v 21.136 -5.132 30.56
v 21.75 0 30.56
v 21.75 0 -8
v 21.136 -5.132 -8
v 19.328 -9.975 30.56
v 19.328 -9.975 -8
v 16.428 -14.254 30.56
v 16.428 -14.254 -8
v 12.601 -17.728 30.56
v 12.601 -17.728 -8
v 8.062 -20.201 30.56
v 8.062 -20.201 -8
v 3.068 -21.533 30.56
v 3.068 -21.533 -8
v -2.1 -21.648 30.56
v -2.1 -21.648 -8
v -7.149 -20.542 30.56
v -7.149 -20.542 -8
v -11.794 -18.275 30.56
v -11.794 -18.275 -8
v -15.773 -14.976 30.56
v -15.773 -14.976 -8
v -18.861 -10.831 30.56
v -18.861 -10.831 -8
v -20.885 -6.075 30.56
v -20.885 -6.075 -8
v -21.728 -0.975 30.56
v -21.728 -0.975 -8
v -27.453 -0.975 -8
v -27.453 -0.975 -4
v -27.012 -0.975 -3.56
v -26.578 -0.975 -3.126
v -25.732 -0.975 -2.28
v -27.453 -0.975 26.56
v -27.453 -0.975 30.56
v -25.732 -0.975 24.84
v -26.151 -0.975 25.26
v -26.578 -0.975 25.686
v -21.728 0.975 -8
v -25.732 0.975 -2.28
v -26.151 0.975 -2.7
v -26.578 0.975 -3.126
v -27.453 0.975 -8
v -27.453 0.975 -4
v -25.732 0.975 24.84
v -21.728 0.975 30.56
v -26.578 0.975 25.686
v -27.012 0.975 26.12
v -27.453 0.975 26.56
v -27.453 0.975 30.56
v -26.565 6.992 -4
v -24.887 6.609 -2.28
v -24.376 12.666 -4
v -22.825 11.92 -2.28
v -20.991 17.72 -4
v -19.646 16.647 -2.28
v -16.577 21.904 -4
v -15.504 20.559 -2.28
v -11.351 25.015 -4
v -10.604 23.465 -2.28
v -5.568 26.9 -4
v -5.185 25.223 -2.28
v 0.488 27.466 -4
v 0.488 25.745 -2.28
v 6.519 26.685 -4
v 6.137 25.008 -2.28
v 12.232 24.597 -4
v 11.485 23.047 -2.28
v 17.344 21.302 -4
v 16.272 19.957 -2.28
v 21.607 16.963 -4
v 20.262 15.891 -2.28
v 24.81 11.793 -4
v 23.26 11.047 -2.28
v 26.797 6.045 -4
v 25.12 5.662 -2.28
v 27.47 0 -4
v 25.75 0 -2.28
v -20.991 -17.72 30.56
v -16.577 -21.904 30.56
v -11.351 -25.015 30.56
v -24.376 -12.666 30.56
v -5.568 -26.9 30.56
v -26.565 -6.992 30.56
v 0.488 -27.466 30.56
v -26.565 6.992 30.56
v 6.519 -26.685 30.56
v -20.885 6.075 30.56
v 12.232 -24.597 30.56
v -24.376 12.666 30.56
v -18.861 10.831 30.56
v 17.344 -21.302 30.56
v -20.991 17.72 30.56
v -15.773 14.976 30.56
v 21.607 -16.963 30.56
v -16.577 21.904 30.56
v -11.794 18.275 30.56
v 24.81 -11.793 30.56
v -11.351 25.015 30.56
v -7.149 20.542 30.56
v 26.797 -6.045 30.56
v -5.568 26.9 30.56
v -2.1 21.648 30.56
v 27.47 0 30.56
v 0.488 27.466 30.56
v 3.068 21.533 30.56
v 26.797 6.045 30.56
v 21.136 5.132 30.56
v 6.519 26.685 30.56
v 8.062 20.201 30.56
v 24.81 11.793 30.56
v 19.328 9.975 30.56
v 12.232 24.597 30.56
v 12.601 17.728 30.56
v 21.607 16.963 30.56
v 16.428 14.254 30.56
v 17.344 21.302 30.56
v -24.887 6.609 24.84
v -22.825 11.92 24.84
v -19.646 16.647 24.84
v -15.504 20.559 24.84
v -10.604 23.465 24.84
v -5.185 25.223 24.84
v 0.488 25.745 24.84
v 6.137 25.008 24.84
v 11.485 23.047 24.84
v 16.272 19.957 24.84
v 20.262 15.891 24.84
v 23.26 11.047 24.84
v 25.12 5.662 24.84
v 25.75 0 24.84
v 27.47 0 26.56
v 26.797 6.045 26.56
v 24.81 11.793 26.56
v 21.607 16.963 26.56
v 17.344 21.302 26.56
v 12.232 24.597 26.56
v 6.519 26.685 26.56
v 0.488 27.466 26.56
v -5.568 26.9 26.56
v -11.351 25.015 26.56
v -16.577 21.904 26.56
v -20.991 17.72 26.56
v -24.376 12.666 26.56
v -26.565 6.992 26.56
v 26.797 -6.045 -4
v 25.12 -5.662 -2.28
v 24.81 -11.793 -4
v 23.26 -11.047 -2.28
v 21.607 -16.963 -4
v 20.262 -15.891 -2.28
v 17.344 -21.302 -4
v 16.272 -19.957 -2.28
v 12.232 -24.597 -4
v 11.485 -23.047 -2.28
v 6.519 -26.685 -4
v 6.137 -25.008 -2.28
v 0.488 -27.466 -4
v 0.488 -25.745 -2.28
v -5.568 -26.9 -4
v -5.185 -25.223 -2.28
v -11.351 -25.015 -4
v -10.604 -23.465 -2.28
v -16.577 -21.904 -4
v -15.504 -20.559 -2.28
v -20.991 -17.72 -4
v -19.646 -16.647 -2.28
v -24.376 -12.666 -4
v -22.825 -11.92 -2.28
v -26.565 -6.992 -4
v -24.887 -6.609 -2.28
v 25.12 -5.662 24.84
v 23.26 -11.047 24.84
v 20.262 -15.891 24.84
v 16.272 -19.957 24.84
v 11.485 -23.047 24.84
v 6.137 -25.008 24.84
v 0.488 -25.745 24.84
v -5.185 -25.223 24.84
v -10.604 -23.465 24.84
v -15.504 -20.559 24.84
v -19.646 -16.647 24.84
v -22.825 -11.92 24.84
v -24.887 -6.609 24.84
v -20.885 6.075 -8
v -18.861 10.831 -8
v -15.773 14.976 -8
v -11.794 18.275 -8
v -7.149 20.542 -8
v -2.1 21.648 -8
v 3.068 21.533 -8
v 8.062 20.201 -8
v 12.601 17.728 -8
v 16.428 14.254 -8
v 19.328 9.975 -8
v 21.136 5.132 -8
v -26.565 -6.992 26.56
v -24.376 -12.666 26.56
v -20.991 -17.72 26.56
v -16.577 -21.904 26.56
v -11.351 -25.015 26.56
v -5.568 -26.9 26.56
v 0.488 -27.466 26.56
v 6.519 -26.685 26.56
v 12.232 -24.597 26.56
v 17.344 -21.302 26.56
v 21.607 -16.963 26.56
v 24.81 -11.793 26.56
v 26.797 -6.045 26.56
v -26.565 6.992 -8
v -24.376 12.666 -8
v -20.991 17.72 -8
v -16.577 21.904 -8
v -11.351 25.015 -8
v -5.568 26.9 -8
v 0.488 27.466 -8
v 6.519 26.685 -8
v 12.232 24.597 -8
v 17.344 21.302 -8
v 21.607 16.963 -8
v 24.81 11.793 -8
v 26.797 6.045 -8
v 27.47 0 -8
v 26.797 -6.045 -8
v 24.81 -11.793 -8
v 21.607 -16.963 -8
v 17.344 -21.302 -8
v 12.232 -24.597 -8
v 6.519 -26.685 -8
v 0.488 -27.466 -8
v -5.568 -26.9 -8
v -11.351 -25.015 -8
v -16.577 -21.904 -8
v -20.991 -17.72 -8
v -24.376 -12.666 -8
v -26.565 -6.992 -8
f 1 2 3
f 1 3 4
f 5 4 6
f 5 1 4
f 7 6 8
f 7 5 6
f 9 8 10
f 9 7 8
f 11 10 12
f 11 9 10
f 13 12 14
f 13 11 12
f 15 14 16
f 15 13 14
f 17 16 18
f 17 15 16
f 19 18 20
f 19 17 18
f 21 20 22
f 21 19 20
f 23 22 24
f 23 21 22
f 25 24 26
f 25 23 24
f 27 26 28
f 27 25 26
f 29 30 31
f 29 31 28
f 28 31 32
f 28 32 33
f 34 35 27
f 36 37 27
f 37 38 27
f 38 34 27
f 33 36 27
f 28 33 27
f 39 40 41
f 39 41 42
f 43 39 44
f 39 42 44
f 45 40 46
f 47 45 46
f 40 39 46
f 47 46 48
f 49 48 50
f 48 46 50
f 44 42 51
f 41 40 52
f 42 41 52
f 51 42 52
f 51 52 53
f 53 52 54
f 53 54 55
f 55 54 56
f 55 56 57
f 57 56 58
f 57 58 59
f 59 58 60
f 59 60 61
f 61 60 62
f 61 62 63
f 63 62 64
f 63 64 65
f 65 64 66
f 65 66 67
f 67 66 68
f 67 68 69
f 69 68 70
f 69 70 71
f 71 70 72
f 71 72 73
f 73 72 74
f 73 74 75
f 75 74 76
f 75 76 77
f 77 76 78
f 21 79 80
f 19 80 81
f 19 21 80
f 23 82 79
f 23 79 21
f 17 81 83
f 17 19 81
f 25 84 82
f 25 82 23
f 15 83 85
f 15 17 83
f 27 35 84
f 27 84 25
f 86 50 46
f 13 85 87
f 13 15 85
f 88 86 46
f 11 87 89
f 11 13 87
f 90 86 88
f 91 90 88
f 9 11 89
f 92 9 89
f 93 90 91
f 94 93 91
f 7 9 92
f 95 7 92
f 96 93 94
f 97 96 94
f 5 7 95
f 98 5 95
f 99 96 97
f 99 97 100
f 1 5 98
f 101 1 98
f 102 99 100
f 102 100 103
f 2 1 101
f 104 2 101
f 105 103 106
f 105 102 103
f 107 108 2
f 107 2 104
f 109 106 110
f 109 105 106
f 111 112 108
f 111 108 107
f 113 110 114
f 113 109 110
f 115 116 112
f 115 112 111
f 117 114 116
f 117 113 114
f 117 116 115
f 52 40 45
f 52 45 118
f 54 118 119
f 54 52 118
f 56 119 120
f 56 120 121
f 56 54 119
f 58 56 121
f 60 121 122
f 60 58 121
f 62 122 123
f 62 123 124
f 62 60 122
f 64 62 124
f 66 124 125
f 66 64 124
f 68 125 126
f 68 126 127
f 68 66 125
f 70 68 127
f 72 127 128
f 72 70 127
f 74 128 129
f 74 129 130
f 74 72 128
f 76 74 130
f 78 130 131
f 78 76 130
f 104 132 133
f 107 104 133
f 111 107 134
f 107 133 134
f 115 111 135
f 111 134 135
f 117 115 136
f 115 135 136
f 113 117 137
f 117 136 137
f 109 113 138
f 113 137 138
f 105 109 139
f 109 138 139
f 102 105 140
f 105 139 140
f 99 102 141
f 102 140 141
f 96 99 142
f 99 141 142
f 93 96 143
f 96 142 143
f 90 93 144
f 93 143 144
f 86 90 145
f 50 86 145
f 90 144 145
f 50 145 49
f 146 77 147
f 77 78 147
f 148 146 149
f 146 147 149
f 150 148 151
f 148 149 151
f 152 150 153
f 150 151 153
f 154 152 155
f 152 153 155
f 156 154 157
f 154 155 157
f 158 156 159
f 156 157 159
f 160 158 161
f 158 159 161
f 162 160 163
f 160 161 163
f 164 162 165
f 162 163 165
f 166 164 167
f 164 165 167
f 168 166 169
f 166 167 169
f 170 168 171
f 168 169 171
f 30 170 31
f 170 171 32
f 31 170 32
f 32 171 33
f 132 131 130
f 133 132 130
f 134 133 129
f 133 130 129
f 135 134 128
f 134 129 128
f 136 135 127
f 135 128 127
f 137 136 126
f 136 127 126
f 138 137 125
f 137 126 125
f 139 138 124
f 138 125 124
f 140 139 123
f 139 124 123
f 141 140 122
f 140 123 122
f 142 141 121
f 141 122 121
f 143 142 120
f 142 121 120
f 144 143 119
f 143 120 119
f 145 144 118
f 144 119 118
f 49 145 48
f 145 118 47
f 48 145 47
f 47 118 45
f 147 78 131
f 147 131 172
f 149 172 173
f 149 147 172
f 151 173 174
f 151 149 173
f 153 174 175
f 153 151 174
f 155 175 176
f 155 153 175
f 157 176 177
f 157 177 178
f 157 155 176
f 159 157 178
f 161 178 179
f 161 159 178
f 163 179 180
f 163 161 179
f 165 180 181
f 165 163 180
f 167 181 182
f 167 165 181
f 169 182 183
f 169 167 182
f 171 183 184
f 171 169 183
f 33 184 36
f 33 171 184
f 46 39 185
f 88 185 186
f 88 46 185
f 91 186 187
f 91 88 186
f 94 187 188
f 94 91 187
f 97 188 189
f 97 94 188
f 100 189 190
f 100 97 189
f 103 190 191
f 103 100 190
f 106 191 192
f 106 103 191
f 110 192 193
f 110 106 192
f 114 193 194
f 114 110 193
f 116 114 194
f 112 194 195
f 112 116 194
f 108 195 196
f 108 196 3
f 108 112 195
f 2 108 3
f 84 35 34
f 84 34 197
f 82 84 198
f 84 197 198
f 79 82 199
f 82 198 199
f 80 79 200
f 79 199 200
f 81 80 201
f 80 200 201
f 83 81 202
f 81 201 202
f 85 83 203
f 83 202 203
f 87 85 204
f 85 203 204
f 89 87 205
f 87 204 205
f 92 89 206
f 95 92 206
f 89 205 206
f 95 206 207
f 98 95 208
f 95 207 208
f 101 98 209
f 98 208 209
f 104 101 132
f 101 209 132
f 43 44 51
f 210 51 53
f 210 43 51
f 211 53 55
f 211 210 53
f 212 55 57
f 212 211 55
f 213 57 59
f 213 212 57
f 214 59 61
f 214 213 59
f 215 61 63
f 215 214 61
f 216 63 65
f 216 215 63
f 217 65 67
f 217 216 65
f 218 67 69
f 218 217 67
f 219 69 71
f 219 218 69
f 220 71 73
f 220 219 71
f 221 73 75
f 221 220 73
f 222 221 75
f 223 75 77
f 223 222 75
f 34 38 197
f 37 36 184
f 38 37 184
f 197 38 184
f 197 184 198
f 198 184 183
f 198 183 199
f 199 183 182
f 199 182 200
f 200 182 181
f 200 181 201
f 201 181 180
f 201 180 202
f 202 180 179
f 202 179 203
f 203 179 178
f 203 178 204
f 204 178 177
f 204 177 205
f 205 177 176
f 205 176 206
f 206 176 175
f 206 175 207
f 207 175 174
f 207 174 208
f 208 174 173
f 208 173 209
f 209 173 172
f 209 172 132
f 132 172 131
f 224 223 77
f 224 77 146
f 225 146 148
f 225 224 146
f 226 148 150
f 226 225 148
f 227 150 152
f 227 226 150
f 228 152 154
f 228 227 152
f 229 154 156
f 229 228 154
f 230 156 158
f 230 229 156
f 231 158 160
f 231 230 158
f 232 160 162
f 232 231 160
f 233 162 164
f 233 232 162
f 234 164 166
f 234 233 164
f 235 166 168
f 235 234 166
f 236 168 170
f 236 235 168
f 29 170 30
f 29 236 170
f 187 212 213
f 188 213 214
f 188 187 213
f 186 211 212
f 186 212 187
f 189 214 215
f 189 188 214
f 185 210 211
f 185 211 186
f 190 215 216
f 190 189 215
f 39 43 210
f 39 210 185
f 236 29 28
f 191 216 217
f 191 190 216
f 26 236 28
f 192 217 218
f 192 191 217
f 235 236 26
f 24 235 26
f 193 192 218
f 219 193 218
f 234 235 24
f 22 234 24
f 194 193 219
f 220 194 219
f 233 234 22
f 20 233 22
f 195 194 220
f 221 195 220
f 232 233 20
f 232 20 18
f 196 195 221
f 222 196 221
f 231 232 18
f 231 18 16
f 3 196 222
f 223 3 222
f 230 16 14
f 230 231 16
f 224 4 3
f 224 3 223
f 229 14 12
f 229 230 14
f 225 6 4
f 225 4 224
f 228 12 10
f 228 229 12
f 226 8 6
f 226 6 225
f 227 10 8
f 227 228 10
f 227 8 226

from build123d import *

# Parameters (mm, degrees)
IZIM1_R                     = 25.75
Y_KSEKLIK_EKSTR_ZYON2_DEPTH = 22.56
IZIM2_R                     = 21.75
KES_EKSTR_ZYON1_DEPTH       = 22.56
IZIM3_R                     = 27.47
Y_KSEKLIK_EKSTR_ZYON3_DEPTH = 8
PAH1_SIZE                   = 4
Y_KSEKLIK_EKSTR_ZYON4_START = 8
IZIM5_R                     = 27.47
Y_KSEKLIK_EKSTR_ZYON4_DEPTH = 8
PAH2_SIZE                   = 4
IZIM6_R                     = 21.75
KES_EKSTR_ZYON4_DEPTH       = 8
KES_EKSTR_ZYON5_START       = -8
IZIM7_R                     = 21.75
KES_EKSTR_ZYON5_DEPTH       = 8
KES_EKSTR_ZYON6_START       = -64
KES_EKSTR_ZYON6_DEPTH       = 64


with BuildPart() as part:
    # Çizim1 → Yükseklik-Ekstrüzyon2 (new body)
    with BuildSketch(Plane.XY):
        Circle(IZIM1_R)
    extrude(amount=Y_KSEKLIK_EKSTR_ZYON2_DEPTH)

    # Çizim2 → Kes-Ekstrüzyon1 (cut)
    with BuildSketch(Plane.XY.offset(22.56)):
        Circle(IZIM2_R)
    extrude(amount=-KES_EKSTR_ZYON1_DEPTH, mode=Mode.SUBTRACT)

    # Çizim3 → Yükseklik-Ekstrüzyon3 (add)
    with BuildSketch(Plane.XY.offset(22.56)):
        Circle(IZIM3_R)
    extrude(amount=Y_KSEKLIK_EKSTR_ZYON3_DEPTH)

    # Pah1
    # the kernel refuses this chamfer: 4 mm, written as the material it takes off along each edge
    with BuildSketch(Plane(origin=(0, 0, 22.56), x_dir=(1, 0, 0), z_dir=(0, -1, 0))) as pah1_piece_1_section:
        Polygon((27.47, PAH1_SIZE), (27.47 - PAH1_SIZE, 0), (27.47, 0), align=None)
    pah1_piece_1 = revolve(axis=Axis((0, 0, 22.56), (0, 0, 1)), mode=Mode.PRIVATE)
    pah1_piece_1 = pah1_piece_1 - Plane(origin=(0, 0, 25.685965648), x_dir=(1, 0, 0), z_dir=(0, 0, -1)) * Cylinder(25.75, 110, mode=Mode.PRIVATE)
    add(pah1_piece_1, mode=Mode.SUBTRACT)

    # Çizim5 → Yükseklik-Ekstrüzyon4 (add)
    with BuildSketch(Plane(origin=(0, 0, 0), x_dir=(-1, 0, 0), z_dir=(0, 0, -1)).offset(Y_KSEKLIK_EKSTR_ZYON4_START)):
        with Locations(Location((0, 0, 0), (0, 0, 180))):
            Circle(IZIM5_R)
    extrude(amount=-Y_KSEKLIK_EKSTR_ZYON4_DEPTH)

    # Pah2
    # the kernel refuses this chamfer: 4 mm, written as the material it takes off along each edge
    with BuildSketch(Plane(origin=(0, 0, 0), x_dir=(1, 0, 0), z_dir=(0, 1, 0))) as pah2_piece_1_section:
        Polygon((27.47, PAH2_SIZE), (27.47 - PAH2_SIZE, 0), (27.47, 0), align=None)
    pah2_piece_1 = revolve(axis=Axis((0, 0, 0), (0, 0, -1)), mode=Mode.PRIVATE)
    pah2_piece_1 = pah2_piece_1 - Plane(origin=(0, 0, -3.125965648), x_dir=(1, 0, 0), z_dir=(0, 0, -1)) * Cylinder(25.75, 110, mode=Mode.PRIVATE)
    add(pah2_piece_1, mode=Mode.SUBTRACT)

    # Çizim6 → Kes-Ekstrüzyon4 (cut)
    with BuildSketch(Plane.XY.offset(30.56)):
        Circle(IZIM6_R)
    extrude(amount=-KES_EKSTR_ZYON4_DEPTH, mode=Mode.SUBTRACT)

    # Çizim7 → Kes-Ekstrüzyon5 (cut)
    with BuildSketch(Plane(origin=(0, 0, -8), x_dir=(-1, 0, 0), z_dir=(0, 0, -1)).offset(KES_EKSTR_ZYON5_START)):
        with Locations(Location((0, 0, 0), (0, 0, 180))):
            Circle(IZIM7_R)
    extrude(amount=KES_EKSTR_ZYON5_DEPTH, mode=Mode.SUBTRACT)

    # Çizim8 → Kes-Ekstrüzyon6 (cut)
    with BuildSketch(Plane(origin=(0, 0, -8), x_dir=(-1, 0, 0), z_dir=(0, 0, -1)).offset(KES_EKSTR_ZYON6_START)):
        with BuildLine():
            Line((21.728135562, 0.975), (27.45269158, 0.975))
            ThreePointArc((27.45269158, 0.975), (27.47, 0), (27.45269158, -0.975))
            Line((27.45269158, -0.975), (21.728135562, -0.975))
            ThreePointArc((21.728135562, -0.975), (21.75, 0), (21.728135562, 0.975))
        make_face()
    extrude(amount=KES_EKSTR_ZYON6_DEPTH, mode=Mode.SUBTRACT)


solid = part.part
